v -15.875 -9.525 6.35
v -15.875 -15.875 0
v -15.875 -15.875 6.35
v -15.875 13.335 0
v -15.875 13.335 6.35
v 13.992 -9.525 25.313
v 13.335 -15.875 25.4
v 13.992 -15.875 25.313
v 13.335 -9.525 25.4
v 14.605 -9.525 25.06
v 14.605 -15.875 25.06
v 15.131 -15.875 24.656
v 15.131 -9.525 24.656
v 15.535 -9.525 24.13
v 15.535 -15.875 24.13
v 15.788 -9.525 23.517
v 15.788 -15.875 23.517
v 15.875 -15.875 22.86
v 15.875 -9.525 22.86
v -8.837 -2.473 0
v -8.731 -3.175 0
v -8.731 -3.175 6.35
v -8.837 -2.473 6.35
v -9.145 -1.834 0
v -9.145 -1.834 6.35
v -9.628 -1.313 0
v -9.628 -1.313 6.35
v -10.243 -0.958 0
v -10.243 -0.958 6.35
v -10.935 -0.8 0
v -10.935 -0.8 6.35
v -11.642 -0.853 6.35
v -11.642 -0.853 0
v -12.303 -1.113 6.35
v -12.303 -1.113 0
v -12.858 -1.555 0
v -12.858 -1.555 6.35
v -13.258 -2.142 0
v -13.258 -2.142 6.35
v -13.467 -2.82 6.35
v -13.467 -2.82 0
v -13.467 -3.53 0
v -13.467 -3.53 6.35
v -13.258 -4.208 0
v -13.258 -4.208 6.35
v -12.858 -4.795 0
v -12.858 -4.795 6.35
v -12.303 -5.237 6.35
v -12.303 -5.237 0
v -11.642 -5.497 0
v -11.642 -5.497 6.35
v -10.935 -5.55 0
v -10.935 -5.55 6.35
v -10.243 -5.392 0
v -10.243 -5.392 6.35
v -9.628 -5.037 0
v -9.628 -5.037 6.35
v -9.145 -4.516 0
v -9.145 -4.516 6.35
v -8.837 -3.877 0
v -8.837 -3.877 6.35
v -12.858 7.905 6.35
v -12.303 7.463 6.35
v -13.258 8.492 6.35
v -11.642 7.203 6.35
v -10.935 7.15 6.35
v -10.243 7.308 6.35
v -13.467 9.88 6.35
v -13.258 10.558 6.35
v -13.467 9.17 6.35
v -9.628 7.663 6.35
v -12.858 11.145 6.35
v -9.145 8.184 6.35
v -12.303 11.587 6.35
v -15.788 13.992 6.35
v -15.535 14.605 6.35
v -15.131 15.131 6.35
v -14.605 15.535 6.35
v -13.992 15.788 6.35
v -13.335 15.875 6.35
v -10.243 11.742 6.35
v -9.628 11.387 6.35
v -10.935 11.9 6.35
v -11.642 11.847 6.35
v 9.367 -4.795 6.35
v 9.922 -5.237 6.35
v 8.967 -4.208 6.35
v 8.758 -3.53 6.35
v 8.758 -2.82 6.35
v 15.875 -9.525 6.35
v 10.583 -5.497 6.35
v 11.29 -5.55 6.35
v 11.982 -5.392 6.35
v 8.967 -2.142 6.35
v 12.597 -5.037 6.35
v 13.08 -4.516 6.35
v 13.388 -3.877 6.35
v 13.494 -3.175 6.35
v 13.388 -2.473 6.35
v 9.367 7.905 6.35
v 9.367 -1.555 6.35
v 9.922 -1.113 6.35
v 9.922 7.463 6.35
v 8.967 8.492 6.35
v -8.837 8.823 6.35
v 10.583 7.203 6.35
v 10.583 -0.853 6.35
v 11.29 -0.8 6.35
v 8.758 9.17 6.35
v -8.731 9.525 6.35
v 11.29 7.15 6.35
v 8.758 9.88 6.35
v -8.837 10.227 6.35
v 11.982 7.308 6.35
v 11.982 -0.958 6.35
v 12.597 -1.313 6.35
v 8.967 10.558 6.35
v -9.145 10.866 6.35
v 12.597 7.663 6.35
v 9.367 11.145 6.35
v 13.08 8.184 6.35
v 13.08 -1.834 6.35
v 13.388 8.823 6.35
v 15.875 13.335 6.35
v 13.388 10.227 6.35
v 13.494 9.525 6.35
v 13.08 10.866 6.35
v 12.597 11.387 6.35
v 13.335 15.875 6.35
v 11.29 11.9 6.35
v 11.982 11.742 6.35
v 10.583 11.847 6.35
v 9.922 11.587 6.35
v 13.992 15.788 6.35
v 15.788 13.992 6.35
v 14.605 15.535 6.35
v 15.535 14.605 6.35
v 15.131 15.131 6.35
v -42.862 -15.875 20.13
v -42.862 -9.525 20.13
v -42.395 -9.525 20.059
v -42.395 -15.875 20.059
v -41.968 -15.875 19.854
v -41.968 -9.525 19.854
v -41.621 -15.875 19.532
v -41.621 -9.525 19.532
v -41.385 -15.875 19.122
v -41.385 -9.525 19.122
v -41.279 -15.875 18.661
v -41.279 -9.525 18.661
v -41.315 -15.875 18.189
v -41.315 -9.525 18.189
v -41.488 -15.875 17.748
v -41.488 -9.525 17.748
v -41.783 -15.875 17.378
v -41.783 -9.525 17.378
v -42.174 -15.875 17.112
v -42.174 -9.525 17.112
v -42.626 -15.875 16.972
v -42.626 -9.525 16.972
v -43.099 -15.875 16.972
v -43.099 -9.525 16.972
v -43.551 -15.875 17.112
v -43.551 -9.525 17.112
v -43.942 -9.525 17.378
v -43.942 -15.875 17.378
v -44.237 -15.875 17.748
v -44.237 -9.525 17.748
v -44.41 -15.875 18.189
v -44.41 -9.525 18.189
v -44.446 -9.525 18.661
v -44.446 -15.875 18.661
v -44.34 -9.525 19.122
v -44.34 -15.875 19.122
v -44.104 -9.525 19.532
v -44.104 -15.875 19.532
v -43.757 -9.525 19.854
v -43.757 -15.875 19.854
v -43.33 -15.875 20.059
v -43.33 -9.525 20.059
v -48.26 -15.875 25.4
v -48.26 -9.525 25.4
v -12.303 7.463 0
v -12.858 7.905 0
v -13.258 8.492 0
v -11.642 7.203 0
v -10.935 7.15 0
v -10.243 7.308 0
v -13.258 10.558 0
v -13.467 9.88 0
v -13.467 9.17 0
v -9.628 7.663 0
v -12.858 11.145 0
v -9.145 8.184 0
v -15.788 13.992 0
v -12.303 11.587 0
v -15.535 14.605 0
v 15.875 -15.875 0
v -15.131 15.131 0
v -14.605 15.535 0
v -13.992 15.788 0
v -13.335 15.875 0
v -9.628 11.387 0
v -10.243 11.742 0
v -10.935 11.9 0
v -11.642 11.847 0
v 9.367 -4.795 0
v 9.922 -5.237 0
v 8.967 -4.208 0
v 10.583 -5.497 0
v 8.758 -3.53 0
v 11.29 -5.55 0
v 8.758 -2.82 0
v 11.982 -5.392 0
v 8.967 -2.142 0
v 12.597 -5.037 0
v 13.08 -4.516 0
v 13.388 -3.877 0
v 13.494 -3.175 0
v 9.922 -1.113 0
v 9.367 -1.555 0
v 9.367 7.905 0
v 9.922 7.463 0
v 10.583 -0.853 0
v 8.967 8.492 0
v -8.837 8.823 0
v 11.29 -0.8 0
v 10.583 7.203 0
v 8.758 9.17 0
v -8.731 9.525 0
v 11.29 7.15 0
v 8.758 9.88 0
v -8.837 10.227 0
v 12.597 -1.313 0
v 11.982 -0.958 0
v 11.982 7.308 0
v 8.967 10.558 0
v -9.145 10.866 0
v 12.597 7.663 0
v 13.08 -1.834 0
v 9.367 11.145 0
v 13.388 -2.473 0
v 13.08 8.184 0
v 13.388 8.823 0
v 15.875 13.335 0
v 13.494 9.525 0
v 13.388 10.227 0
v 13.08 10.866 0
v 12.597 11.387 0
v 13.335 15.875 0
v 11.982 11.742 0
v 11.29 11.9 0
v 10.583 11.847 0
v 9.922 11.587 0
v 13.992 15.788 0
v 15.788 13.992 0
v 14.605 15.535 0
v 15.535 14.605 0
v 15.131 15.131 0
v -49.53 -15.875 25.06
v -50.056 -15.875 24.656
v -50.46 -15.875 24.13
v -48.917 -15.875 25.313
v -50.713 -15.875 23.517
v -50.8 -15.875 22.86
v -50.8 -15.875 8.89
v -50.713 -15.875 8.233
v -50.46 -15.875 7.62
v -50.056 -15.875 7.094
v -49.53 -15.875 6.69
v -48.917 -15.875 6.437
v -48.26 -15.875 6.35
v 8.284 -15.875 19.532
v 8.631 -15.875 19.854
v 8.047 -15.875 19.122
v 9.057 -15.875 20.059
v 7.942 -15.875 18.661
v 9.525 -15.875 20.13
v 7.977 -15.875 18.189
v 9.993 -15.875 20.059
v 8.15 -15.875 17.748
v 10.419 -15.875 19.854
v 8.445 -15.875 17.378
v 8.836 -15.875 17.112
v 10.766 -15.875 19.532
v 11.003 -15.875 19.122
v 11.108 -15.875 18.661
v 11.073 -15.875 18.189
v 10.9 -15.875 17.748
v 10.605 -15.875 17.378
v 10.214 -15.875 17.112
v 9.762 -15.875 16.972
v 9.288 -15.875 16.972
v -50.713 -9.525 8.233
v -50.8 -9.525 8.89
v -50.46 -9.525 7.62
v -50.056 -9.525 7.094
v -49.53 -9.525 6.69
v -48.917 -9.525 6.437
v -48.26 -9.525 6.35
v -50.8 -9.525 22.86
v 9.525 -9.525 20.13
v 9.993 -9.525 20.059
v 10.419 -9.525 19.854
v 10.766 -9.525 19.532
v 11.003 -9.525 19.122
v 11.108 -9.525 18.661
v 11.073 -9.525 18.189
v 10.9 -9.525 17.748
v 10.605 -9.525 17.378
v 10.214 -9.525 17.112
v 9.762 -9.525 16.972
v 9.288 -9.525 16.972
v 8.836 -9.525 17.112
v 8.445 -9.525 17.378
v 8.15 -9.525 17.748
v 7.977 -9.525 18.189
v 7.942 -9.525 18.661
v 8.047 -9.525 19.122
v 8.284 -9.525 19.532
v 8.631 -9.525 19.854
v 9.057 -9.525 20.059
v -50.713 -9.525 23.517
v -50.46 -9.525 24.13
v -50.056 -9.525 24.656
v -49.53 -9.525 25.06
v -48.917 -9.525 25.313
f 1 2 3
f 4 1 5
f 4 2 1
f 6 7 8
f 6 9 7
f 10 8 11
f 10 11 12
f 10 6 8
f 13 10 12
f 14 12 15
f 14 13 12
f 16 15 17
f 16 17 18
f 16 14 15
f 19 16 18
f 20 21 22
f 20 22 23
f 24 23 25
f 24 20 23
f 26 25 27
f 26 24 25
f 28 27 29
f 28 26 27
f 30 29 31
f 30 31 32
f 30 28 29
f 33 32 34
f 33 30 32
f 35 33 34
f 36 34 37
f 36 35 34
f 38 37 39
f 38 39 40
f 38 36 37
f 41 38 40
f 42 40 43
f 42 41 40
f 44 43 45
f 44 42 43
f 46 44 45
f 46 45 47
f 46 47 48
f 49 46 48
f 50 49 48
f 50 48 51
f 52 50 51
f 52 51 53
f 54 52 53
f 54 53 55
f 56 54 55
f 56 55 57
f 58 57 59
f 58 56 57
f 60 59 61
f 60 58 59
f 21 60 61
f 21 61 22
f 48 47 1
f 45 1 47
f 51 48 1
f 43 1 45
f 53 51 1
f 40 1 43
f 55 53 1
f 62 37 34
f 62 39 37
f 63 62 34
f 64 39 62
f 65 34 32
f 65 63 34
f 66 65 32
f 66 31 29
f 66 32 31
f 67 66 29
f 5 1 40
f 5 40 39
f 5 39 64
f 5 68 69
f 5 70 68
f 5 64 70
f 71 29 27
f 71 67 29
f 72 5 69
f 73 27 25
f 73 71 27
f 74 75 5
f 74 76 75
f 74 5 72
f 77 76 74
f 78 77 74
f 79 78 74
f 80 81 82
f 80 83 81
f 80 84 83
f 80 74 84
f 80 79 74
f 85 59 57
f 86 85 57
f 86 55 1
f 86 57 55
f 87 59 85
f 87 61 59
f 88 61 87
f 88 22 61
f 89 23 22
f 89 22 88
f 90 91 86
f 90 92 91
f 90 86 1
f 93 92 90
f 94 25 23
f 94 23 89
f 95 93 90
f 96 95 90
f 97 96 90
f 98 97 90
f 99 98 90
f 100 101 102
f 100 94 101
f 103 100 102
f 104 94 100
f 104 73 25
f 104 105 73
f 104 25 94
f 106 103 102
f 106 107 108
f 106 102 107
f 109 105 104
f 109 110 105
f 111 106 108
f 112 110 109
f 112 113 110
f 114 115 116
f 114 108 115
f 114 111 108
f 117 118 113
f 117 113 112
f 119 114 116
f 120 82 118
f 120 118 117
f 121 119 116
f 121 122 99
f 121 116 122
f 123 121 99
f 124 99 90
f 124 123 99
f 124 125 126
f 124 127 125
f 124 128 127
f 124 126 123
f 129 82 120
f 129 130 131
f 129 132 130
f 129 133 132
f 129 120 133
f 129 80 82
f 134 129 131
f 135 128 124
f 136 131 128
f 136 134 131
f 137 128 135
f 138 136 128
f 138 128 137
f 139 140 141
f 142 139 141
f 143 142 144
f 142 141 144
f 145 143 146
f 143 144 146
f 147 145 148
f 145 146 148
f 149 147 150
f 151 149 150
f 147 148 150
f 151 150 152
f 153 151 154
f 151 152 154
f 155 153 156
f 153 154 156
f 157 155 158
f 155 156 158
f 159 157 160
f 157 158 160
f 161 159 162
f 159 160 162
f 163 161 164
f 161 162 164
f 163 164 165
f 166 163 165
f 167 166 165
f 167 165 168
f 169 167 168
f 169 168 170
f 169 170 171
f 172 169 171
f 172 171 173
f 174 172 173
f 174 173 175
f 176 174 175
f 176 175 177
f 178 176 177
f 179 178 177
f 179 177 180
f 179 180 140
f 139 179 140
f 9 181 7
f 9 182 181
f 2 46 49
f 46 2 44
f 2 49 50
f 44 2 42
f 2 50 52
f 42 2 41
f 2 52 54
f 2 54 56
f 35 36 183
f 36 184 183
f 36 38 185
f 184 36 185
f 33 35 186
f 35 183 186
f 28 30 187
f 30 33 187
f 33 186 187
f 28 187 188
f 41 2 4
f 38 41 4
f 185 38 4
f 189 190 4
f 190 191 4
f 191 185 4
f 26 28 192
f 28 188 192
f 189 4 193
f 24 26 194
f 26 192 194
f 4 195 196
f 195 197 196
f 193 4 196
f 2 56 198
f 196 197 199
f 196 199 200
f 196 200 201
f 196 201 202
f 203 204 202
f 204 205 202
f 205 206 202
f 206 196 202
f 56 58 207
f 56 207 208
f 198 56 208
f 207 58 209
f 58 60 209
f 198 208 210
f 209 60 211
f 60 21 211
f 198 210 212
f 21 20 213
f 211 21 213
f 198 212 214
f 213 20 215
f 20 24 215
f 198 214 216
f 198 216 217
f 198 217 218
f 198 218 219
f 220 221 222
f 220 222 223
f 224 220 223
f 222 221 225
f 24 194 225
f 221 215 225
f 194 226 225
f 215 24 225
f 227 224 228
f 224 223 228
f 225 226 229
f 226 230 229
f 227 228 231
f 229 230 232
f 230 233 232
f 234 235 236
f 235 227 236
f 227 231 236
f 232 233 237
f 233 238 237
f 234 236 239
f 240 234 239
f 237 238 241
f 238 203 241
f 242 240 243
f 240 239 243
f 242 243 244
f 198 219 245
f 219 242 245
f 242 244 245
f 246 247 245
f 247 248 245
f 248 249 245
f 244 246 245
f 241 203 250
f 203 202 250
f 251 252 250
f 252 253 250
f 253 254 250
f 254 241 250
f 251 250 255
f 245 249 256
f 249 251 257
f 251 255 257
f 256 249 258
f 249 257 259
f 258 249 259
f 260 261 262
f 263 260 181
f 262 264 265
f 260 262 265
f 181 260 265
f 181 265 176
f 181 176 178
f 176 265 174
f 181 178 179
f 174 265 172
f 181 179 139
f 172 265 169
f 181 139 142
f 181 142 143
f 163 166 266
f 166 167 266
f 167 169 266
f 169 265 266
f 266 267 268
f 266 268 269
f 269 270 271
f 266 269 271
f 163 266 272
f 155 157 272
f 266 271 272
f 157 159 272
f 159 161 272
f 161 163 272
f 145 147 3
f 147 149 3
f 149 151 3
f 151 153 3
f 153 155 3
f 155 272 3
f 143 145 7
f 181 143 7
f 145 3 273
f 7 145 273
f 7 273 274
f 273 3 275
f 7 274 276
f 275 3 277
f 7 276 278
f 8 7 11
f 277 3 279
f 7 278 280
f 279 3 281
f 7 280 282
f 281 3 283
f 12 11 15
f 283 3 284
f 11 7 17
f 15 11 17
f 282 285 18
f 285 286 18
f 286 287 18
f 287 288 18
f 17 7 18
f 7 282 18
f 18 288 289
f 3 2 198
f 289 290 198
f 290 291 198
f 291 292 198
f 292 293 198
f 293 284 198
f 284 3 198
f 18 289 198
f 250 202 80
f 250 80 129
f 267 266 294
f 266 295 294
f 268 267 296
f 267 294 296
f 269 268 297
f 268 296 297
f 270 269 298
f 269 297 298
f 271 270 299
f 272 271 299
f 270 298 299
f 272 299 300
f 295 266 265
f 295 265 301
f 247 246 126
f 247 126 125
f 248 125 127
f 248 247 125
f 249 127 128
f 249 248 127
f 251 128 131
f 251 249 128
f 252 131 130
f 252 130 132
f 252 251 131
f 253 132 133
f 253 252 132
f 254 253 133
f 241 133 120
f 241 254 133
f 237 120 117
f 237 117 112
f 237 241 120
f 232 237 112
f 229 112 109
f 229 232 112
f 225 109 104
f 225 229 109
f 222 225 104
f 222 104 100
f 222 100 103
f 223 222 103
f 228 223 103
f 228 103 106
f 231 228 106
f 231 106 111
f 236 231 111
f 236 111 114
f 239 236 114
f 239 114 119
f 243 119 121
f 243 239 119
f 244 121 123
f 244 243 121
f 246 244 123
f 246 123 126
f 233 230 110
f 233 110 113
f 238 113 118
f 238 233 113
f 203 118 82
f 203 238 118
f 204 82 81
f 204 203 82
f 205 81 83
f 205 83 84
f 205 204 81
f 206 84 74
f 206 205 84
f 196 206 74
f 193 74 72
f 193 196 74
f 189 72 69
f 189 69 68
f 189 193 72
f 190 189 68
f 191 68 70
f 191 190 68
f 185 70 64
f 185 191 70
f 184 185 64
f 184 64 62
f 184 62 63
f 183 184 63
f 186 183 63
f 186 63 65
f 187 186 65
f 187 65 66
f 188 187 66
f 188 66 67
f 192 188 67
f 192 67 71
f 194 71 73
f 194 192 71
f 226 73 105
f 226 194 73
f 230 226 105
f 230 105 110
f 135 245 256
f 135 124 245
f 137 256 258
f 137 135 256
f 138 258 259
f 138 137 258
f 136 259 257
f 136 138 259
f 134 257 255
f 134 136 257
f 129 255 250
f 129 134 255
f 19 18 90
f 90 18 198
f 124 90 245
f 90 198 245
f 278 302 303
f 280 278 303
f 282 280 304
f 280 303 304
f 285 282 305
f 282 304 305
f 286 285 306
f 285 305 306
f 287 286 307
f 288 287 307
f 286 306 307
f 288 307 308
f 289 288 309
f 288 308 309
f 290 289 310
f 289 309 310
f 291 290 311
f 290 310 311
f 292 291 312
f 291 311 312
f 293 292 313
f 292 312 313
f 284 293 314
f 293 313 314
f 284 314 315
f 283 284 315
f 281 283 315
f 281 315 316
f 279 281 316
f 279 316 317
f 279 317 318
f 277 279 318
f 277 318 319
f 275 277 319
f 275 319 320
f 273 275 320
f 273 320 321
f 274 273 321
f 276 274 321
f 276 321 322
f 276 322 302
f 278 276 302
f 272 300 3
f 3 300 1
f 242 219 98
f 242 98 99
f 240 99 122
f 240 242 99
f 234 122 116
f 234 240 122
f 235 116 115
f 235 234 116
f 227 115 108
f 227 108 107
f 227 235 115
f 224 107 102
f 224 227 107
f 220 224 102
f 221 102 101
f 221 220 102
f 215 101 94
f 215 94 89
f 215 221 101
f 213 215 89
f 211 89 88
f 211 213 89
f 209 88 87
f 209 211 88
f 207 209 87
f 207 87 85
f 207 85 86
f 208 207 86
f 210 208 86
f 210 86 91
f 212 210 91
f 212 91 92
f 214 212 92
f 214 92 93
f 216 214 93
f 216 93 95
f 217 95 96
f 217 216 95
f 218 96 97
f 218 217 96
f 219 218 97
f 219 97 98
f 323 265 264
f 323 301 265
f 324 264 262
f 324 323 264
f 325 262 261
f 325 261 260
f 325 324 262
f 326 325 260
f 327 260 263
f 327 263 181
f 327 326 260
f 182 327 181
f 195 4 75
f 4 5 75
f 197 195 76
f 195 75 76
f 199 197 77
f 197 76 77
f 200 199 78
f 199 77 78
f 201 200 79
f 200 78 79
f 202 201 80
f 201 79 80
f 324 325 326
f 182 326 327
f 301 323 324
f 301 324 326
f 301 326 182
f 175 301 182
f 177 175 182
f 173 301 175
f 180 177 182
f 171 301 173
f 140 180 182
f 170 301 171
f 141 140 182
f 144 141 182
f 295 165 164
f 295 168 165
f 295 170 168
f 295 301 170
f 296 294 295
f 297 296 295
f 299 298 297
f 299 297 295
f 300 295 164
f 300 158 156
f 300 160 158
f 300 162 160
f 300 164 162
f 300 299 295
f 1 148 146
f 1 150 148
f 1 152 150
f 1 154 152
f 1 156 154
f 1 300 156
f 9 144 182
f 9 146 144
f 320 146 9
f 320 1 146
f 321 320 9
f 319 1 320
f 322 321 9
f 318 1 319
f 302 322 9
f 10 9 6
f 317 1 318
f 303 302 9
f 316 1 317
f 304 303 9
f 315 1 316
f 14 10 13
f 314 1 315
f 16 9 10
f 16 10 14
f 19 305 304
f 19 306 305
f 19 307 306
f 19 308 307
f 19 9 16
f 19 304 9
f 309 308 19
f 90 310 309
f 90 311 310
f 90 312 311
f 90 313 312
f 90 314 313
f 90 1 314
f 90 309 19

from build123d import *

# Parameters (mm, degrees)
SKETCH1_W           = 31.75
SKETCH1_H           = 31.75
SKETCH1_R           = 2.38125
BOSS_EXTRUDE1_DEPTH = 6.35
SKETCH2_W           = 66.675
SKETCH2_H           = 6.35
BOSS_EXTRUDE2_DEPTH = 19.05
SKETCH3_R           = 1.5875
CUT_EXTRUDE1_DEPTH  = 63.217039467
FILLET1_R           = 2.54


with BuildPart() as part:
    # Sketch1 → Boss-Extrude1 (new body)
    with BuildSketch(Plane.XY):
        Rectangle(SKETCH1_W, SKETCH1_H)
        with Locations((-11.1125, -3.175)):
            Circle(SKETCH1_R, mode=Mode.SUBTRACT)
        with Locations((-11.1125, 9.525)):
            Circle(SKETCH1_R, mode=Mode.SUBTRACT)
        with Locations((11.1125, 9.525)):
            Circle(SKETCH1_R, mode=Mode.SUBTRACT)
        with Locations((11.1125, -3.175)):
            Circle(SKETCH1_R, mode=Mode.SUBTRACT)
    extrude(amount=BOSS_EXTRUDE1_DEPTH)

    # Sketch2 → Boss-Extrude2 (add)
    with BuildSketch(Plane.XY.offset(6.35)):
        with Locations((-17.4625, -12.7)):
            Rectangle(SKETCH2_W, SKETCH2_H)
    extrude(amount=BOSS_EXTRUDE2_DEPTH)

    # Sketch3 → Cut-Extrude1 (cut, through all)
    with BuildSketch(Plane(origin=(0, -9.525, 0), x_dir=(1, 0, 0), z_dir=(0, 1, 0))):
        with Locations(Location((9.525, -18.542, 0), (0, 0, 270))):
            Circle(SKETCH3_R)
        with Locations(Location((-42.8625, -18.542, 0), (0, 0, 270))):
            Circle(SKETCH3_R)
    extrude(amount=-CUT_EXTRUDE1_DEPTH, mode=Mode.SUBTRACT)

    # Fillet1
    fillet1_edges = [part.edges().sort_by_distance(p)[0] for p in [
        (-50.8, -12.7, 6.35),
        (-50.8, -12.7, 25.4),
        (15.875, -12.7, 25.4),
        (-15.875, 15.875, 3.175),
        (15.875, 15.875, 3.175),
    ]]
    fillet(fillet1_edges, radius=FILLET1_R)


solid = part.part
